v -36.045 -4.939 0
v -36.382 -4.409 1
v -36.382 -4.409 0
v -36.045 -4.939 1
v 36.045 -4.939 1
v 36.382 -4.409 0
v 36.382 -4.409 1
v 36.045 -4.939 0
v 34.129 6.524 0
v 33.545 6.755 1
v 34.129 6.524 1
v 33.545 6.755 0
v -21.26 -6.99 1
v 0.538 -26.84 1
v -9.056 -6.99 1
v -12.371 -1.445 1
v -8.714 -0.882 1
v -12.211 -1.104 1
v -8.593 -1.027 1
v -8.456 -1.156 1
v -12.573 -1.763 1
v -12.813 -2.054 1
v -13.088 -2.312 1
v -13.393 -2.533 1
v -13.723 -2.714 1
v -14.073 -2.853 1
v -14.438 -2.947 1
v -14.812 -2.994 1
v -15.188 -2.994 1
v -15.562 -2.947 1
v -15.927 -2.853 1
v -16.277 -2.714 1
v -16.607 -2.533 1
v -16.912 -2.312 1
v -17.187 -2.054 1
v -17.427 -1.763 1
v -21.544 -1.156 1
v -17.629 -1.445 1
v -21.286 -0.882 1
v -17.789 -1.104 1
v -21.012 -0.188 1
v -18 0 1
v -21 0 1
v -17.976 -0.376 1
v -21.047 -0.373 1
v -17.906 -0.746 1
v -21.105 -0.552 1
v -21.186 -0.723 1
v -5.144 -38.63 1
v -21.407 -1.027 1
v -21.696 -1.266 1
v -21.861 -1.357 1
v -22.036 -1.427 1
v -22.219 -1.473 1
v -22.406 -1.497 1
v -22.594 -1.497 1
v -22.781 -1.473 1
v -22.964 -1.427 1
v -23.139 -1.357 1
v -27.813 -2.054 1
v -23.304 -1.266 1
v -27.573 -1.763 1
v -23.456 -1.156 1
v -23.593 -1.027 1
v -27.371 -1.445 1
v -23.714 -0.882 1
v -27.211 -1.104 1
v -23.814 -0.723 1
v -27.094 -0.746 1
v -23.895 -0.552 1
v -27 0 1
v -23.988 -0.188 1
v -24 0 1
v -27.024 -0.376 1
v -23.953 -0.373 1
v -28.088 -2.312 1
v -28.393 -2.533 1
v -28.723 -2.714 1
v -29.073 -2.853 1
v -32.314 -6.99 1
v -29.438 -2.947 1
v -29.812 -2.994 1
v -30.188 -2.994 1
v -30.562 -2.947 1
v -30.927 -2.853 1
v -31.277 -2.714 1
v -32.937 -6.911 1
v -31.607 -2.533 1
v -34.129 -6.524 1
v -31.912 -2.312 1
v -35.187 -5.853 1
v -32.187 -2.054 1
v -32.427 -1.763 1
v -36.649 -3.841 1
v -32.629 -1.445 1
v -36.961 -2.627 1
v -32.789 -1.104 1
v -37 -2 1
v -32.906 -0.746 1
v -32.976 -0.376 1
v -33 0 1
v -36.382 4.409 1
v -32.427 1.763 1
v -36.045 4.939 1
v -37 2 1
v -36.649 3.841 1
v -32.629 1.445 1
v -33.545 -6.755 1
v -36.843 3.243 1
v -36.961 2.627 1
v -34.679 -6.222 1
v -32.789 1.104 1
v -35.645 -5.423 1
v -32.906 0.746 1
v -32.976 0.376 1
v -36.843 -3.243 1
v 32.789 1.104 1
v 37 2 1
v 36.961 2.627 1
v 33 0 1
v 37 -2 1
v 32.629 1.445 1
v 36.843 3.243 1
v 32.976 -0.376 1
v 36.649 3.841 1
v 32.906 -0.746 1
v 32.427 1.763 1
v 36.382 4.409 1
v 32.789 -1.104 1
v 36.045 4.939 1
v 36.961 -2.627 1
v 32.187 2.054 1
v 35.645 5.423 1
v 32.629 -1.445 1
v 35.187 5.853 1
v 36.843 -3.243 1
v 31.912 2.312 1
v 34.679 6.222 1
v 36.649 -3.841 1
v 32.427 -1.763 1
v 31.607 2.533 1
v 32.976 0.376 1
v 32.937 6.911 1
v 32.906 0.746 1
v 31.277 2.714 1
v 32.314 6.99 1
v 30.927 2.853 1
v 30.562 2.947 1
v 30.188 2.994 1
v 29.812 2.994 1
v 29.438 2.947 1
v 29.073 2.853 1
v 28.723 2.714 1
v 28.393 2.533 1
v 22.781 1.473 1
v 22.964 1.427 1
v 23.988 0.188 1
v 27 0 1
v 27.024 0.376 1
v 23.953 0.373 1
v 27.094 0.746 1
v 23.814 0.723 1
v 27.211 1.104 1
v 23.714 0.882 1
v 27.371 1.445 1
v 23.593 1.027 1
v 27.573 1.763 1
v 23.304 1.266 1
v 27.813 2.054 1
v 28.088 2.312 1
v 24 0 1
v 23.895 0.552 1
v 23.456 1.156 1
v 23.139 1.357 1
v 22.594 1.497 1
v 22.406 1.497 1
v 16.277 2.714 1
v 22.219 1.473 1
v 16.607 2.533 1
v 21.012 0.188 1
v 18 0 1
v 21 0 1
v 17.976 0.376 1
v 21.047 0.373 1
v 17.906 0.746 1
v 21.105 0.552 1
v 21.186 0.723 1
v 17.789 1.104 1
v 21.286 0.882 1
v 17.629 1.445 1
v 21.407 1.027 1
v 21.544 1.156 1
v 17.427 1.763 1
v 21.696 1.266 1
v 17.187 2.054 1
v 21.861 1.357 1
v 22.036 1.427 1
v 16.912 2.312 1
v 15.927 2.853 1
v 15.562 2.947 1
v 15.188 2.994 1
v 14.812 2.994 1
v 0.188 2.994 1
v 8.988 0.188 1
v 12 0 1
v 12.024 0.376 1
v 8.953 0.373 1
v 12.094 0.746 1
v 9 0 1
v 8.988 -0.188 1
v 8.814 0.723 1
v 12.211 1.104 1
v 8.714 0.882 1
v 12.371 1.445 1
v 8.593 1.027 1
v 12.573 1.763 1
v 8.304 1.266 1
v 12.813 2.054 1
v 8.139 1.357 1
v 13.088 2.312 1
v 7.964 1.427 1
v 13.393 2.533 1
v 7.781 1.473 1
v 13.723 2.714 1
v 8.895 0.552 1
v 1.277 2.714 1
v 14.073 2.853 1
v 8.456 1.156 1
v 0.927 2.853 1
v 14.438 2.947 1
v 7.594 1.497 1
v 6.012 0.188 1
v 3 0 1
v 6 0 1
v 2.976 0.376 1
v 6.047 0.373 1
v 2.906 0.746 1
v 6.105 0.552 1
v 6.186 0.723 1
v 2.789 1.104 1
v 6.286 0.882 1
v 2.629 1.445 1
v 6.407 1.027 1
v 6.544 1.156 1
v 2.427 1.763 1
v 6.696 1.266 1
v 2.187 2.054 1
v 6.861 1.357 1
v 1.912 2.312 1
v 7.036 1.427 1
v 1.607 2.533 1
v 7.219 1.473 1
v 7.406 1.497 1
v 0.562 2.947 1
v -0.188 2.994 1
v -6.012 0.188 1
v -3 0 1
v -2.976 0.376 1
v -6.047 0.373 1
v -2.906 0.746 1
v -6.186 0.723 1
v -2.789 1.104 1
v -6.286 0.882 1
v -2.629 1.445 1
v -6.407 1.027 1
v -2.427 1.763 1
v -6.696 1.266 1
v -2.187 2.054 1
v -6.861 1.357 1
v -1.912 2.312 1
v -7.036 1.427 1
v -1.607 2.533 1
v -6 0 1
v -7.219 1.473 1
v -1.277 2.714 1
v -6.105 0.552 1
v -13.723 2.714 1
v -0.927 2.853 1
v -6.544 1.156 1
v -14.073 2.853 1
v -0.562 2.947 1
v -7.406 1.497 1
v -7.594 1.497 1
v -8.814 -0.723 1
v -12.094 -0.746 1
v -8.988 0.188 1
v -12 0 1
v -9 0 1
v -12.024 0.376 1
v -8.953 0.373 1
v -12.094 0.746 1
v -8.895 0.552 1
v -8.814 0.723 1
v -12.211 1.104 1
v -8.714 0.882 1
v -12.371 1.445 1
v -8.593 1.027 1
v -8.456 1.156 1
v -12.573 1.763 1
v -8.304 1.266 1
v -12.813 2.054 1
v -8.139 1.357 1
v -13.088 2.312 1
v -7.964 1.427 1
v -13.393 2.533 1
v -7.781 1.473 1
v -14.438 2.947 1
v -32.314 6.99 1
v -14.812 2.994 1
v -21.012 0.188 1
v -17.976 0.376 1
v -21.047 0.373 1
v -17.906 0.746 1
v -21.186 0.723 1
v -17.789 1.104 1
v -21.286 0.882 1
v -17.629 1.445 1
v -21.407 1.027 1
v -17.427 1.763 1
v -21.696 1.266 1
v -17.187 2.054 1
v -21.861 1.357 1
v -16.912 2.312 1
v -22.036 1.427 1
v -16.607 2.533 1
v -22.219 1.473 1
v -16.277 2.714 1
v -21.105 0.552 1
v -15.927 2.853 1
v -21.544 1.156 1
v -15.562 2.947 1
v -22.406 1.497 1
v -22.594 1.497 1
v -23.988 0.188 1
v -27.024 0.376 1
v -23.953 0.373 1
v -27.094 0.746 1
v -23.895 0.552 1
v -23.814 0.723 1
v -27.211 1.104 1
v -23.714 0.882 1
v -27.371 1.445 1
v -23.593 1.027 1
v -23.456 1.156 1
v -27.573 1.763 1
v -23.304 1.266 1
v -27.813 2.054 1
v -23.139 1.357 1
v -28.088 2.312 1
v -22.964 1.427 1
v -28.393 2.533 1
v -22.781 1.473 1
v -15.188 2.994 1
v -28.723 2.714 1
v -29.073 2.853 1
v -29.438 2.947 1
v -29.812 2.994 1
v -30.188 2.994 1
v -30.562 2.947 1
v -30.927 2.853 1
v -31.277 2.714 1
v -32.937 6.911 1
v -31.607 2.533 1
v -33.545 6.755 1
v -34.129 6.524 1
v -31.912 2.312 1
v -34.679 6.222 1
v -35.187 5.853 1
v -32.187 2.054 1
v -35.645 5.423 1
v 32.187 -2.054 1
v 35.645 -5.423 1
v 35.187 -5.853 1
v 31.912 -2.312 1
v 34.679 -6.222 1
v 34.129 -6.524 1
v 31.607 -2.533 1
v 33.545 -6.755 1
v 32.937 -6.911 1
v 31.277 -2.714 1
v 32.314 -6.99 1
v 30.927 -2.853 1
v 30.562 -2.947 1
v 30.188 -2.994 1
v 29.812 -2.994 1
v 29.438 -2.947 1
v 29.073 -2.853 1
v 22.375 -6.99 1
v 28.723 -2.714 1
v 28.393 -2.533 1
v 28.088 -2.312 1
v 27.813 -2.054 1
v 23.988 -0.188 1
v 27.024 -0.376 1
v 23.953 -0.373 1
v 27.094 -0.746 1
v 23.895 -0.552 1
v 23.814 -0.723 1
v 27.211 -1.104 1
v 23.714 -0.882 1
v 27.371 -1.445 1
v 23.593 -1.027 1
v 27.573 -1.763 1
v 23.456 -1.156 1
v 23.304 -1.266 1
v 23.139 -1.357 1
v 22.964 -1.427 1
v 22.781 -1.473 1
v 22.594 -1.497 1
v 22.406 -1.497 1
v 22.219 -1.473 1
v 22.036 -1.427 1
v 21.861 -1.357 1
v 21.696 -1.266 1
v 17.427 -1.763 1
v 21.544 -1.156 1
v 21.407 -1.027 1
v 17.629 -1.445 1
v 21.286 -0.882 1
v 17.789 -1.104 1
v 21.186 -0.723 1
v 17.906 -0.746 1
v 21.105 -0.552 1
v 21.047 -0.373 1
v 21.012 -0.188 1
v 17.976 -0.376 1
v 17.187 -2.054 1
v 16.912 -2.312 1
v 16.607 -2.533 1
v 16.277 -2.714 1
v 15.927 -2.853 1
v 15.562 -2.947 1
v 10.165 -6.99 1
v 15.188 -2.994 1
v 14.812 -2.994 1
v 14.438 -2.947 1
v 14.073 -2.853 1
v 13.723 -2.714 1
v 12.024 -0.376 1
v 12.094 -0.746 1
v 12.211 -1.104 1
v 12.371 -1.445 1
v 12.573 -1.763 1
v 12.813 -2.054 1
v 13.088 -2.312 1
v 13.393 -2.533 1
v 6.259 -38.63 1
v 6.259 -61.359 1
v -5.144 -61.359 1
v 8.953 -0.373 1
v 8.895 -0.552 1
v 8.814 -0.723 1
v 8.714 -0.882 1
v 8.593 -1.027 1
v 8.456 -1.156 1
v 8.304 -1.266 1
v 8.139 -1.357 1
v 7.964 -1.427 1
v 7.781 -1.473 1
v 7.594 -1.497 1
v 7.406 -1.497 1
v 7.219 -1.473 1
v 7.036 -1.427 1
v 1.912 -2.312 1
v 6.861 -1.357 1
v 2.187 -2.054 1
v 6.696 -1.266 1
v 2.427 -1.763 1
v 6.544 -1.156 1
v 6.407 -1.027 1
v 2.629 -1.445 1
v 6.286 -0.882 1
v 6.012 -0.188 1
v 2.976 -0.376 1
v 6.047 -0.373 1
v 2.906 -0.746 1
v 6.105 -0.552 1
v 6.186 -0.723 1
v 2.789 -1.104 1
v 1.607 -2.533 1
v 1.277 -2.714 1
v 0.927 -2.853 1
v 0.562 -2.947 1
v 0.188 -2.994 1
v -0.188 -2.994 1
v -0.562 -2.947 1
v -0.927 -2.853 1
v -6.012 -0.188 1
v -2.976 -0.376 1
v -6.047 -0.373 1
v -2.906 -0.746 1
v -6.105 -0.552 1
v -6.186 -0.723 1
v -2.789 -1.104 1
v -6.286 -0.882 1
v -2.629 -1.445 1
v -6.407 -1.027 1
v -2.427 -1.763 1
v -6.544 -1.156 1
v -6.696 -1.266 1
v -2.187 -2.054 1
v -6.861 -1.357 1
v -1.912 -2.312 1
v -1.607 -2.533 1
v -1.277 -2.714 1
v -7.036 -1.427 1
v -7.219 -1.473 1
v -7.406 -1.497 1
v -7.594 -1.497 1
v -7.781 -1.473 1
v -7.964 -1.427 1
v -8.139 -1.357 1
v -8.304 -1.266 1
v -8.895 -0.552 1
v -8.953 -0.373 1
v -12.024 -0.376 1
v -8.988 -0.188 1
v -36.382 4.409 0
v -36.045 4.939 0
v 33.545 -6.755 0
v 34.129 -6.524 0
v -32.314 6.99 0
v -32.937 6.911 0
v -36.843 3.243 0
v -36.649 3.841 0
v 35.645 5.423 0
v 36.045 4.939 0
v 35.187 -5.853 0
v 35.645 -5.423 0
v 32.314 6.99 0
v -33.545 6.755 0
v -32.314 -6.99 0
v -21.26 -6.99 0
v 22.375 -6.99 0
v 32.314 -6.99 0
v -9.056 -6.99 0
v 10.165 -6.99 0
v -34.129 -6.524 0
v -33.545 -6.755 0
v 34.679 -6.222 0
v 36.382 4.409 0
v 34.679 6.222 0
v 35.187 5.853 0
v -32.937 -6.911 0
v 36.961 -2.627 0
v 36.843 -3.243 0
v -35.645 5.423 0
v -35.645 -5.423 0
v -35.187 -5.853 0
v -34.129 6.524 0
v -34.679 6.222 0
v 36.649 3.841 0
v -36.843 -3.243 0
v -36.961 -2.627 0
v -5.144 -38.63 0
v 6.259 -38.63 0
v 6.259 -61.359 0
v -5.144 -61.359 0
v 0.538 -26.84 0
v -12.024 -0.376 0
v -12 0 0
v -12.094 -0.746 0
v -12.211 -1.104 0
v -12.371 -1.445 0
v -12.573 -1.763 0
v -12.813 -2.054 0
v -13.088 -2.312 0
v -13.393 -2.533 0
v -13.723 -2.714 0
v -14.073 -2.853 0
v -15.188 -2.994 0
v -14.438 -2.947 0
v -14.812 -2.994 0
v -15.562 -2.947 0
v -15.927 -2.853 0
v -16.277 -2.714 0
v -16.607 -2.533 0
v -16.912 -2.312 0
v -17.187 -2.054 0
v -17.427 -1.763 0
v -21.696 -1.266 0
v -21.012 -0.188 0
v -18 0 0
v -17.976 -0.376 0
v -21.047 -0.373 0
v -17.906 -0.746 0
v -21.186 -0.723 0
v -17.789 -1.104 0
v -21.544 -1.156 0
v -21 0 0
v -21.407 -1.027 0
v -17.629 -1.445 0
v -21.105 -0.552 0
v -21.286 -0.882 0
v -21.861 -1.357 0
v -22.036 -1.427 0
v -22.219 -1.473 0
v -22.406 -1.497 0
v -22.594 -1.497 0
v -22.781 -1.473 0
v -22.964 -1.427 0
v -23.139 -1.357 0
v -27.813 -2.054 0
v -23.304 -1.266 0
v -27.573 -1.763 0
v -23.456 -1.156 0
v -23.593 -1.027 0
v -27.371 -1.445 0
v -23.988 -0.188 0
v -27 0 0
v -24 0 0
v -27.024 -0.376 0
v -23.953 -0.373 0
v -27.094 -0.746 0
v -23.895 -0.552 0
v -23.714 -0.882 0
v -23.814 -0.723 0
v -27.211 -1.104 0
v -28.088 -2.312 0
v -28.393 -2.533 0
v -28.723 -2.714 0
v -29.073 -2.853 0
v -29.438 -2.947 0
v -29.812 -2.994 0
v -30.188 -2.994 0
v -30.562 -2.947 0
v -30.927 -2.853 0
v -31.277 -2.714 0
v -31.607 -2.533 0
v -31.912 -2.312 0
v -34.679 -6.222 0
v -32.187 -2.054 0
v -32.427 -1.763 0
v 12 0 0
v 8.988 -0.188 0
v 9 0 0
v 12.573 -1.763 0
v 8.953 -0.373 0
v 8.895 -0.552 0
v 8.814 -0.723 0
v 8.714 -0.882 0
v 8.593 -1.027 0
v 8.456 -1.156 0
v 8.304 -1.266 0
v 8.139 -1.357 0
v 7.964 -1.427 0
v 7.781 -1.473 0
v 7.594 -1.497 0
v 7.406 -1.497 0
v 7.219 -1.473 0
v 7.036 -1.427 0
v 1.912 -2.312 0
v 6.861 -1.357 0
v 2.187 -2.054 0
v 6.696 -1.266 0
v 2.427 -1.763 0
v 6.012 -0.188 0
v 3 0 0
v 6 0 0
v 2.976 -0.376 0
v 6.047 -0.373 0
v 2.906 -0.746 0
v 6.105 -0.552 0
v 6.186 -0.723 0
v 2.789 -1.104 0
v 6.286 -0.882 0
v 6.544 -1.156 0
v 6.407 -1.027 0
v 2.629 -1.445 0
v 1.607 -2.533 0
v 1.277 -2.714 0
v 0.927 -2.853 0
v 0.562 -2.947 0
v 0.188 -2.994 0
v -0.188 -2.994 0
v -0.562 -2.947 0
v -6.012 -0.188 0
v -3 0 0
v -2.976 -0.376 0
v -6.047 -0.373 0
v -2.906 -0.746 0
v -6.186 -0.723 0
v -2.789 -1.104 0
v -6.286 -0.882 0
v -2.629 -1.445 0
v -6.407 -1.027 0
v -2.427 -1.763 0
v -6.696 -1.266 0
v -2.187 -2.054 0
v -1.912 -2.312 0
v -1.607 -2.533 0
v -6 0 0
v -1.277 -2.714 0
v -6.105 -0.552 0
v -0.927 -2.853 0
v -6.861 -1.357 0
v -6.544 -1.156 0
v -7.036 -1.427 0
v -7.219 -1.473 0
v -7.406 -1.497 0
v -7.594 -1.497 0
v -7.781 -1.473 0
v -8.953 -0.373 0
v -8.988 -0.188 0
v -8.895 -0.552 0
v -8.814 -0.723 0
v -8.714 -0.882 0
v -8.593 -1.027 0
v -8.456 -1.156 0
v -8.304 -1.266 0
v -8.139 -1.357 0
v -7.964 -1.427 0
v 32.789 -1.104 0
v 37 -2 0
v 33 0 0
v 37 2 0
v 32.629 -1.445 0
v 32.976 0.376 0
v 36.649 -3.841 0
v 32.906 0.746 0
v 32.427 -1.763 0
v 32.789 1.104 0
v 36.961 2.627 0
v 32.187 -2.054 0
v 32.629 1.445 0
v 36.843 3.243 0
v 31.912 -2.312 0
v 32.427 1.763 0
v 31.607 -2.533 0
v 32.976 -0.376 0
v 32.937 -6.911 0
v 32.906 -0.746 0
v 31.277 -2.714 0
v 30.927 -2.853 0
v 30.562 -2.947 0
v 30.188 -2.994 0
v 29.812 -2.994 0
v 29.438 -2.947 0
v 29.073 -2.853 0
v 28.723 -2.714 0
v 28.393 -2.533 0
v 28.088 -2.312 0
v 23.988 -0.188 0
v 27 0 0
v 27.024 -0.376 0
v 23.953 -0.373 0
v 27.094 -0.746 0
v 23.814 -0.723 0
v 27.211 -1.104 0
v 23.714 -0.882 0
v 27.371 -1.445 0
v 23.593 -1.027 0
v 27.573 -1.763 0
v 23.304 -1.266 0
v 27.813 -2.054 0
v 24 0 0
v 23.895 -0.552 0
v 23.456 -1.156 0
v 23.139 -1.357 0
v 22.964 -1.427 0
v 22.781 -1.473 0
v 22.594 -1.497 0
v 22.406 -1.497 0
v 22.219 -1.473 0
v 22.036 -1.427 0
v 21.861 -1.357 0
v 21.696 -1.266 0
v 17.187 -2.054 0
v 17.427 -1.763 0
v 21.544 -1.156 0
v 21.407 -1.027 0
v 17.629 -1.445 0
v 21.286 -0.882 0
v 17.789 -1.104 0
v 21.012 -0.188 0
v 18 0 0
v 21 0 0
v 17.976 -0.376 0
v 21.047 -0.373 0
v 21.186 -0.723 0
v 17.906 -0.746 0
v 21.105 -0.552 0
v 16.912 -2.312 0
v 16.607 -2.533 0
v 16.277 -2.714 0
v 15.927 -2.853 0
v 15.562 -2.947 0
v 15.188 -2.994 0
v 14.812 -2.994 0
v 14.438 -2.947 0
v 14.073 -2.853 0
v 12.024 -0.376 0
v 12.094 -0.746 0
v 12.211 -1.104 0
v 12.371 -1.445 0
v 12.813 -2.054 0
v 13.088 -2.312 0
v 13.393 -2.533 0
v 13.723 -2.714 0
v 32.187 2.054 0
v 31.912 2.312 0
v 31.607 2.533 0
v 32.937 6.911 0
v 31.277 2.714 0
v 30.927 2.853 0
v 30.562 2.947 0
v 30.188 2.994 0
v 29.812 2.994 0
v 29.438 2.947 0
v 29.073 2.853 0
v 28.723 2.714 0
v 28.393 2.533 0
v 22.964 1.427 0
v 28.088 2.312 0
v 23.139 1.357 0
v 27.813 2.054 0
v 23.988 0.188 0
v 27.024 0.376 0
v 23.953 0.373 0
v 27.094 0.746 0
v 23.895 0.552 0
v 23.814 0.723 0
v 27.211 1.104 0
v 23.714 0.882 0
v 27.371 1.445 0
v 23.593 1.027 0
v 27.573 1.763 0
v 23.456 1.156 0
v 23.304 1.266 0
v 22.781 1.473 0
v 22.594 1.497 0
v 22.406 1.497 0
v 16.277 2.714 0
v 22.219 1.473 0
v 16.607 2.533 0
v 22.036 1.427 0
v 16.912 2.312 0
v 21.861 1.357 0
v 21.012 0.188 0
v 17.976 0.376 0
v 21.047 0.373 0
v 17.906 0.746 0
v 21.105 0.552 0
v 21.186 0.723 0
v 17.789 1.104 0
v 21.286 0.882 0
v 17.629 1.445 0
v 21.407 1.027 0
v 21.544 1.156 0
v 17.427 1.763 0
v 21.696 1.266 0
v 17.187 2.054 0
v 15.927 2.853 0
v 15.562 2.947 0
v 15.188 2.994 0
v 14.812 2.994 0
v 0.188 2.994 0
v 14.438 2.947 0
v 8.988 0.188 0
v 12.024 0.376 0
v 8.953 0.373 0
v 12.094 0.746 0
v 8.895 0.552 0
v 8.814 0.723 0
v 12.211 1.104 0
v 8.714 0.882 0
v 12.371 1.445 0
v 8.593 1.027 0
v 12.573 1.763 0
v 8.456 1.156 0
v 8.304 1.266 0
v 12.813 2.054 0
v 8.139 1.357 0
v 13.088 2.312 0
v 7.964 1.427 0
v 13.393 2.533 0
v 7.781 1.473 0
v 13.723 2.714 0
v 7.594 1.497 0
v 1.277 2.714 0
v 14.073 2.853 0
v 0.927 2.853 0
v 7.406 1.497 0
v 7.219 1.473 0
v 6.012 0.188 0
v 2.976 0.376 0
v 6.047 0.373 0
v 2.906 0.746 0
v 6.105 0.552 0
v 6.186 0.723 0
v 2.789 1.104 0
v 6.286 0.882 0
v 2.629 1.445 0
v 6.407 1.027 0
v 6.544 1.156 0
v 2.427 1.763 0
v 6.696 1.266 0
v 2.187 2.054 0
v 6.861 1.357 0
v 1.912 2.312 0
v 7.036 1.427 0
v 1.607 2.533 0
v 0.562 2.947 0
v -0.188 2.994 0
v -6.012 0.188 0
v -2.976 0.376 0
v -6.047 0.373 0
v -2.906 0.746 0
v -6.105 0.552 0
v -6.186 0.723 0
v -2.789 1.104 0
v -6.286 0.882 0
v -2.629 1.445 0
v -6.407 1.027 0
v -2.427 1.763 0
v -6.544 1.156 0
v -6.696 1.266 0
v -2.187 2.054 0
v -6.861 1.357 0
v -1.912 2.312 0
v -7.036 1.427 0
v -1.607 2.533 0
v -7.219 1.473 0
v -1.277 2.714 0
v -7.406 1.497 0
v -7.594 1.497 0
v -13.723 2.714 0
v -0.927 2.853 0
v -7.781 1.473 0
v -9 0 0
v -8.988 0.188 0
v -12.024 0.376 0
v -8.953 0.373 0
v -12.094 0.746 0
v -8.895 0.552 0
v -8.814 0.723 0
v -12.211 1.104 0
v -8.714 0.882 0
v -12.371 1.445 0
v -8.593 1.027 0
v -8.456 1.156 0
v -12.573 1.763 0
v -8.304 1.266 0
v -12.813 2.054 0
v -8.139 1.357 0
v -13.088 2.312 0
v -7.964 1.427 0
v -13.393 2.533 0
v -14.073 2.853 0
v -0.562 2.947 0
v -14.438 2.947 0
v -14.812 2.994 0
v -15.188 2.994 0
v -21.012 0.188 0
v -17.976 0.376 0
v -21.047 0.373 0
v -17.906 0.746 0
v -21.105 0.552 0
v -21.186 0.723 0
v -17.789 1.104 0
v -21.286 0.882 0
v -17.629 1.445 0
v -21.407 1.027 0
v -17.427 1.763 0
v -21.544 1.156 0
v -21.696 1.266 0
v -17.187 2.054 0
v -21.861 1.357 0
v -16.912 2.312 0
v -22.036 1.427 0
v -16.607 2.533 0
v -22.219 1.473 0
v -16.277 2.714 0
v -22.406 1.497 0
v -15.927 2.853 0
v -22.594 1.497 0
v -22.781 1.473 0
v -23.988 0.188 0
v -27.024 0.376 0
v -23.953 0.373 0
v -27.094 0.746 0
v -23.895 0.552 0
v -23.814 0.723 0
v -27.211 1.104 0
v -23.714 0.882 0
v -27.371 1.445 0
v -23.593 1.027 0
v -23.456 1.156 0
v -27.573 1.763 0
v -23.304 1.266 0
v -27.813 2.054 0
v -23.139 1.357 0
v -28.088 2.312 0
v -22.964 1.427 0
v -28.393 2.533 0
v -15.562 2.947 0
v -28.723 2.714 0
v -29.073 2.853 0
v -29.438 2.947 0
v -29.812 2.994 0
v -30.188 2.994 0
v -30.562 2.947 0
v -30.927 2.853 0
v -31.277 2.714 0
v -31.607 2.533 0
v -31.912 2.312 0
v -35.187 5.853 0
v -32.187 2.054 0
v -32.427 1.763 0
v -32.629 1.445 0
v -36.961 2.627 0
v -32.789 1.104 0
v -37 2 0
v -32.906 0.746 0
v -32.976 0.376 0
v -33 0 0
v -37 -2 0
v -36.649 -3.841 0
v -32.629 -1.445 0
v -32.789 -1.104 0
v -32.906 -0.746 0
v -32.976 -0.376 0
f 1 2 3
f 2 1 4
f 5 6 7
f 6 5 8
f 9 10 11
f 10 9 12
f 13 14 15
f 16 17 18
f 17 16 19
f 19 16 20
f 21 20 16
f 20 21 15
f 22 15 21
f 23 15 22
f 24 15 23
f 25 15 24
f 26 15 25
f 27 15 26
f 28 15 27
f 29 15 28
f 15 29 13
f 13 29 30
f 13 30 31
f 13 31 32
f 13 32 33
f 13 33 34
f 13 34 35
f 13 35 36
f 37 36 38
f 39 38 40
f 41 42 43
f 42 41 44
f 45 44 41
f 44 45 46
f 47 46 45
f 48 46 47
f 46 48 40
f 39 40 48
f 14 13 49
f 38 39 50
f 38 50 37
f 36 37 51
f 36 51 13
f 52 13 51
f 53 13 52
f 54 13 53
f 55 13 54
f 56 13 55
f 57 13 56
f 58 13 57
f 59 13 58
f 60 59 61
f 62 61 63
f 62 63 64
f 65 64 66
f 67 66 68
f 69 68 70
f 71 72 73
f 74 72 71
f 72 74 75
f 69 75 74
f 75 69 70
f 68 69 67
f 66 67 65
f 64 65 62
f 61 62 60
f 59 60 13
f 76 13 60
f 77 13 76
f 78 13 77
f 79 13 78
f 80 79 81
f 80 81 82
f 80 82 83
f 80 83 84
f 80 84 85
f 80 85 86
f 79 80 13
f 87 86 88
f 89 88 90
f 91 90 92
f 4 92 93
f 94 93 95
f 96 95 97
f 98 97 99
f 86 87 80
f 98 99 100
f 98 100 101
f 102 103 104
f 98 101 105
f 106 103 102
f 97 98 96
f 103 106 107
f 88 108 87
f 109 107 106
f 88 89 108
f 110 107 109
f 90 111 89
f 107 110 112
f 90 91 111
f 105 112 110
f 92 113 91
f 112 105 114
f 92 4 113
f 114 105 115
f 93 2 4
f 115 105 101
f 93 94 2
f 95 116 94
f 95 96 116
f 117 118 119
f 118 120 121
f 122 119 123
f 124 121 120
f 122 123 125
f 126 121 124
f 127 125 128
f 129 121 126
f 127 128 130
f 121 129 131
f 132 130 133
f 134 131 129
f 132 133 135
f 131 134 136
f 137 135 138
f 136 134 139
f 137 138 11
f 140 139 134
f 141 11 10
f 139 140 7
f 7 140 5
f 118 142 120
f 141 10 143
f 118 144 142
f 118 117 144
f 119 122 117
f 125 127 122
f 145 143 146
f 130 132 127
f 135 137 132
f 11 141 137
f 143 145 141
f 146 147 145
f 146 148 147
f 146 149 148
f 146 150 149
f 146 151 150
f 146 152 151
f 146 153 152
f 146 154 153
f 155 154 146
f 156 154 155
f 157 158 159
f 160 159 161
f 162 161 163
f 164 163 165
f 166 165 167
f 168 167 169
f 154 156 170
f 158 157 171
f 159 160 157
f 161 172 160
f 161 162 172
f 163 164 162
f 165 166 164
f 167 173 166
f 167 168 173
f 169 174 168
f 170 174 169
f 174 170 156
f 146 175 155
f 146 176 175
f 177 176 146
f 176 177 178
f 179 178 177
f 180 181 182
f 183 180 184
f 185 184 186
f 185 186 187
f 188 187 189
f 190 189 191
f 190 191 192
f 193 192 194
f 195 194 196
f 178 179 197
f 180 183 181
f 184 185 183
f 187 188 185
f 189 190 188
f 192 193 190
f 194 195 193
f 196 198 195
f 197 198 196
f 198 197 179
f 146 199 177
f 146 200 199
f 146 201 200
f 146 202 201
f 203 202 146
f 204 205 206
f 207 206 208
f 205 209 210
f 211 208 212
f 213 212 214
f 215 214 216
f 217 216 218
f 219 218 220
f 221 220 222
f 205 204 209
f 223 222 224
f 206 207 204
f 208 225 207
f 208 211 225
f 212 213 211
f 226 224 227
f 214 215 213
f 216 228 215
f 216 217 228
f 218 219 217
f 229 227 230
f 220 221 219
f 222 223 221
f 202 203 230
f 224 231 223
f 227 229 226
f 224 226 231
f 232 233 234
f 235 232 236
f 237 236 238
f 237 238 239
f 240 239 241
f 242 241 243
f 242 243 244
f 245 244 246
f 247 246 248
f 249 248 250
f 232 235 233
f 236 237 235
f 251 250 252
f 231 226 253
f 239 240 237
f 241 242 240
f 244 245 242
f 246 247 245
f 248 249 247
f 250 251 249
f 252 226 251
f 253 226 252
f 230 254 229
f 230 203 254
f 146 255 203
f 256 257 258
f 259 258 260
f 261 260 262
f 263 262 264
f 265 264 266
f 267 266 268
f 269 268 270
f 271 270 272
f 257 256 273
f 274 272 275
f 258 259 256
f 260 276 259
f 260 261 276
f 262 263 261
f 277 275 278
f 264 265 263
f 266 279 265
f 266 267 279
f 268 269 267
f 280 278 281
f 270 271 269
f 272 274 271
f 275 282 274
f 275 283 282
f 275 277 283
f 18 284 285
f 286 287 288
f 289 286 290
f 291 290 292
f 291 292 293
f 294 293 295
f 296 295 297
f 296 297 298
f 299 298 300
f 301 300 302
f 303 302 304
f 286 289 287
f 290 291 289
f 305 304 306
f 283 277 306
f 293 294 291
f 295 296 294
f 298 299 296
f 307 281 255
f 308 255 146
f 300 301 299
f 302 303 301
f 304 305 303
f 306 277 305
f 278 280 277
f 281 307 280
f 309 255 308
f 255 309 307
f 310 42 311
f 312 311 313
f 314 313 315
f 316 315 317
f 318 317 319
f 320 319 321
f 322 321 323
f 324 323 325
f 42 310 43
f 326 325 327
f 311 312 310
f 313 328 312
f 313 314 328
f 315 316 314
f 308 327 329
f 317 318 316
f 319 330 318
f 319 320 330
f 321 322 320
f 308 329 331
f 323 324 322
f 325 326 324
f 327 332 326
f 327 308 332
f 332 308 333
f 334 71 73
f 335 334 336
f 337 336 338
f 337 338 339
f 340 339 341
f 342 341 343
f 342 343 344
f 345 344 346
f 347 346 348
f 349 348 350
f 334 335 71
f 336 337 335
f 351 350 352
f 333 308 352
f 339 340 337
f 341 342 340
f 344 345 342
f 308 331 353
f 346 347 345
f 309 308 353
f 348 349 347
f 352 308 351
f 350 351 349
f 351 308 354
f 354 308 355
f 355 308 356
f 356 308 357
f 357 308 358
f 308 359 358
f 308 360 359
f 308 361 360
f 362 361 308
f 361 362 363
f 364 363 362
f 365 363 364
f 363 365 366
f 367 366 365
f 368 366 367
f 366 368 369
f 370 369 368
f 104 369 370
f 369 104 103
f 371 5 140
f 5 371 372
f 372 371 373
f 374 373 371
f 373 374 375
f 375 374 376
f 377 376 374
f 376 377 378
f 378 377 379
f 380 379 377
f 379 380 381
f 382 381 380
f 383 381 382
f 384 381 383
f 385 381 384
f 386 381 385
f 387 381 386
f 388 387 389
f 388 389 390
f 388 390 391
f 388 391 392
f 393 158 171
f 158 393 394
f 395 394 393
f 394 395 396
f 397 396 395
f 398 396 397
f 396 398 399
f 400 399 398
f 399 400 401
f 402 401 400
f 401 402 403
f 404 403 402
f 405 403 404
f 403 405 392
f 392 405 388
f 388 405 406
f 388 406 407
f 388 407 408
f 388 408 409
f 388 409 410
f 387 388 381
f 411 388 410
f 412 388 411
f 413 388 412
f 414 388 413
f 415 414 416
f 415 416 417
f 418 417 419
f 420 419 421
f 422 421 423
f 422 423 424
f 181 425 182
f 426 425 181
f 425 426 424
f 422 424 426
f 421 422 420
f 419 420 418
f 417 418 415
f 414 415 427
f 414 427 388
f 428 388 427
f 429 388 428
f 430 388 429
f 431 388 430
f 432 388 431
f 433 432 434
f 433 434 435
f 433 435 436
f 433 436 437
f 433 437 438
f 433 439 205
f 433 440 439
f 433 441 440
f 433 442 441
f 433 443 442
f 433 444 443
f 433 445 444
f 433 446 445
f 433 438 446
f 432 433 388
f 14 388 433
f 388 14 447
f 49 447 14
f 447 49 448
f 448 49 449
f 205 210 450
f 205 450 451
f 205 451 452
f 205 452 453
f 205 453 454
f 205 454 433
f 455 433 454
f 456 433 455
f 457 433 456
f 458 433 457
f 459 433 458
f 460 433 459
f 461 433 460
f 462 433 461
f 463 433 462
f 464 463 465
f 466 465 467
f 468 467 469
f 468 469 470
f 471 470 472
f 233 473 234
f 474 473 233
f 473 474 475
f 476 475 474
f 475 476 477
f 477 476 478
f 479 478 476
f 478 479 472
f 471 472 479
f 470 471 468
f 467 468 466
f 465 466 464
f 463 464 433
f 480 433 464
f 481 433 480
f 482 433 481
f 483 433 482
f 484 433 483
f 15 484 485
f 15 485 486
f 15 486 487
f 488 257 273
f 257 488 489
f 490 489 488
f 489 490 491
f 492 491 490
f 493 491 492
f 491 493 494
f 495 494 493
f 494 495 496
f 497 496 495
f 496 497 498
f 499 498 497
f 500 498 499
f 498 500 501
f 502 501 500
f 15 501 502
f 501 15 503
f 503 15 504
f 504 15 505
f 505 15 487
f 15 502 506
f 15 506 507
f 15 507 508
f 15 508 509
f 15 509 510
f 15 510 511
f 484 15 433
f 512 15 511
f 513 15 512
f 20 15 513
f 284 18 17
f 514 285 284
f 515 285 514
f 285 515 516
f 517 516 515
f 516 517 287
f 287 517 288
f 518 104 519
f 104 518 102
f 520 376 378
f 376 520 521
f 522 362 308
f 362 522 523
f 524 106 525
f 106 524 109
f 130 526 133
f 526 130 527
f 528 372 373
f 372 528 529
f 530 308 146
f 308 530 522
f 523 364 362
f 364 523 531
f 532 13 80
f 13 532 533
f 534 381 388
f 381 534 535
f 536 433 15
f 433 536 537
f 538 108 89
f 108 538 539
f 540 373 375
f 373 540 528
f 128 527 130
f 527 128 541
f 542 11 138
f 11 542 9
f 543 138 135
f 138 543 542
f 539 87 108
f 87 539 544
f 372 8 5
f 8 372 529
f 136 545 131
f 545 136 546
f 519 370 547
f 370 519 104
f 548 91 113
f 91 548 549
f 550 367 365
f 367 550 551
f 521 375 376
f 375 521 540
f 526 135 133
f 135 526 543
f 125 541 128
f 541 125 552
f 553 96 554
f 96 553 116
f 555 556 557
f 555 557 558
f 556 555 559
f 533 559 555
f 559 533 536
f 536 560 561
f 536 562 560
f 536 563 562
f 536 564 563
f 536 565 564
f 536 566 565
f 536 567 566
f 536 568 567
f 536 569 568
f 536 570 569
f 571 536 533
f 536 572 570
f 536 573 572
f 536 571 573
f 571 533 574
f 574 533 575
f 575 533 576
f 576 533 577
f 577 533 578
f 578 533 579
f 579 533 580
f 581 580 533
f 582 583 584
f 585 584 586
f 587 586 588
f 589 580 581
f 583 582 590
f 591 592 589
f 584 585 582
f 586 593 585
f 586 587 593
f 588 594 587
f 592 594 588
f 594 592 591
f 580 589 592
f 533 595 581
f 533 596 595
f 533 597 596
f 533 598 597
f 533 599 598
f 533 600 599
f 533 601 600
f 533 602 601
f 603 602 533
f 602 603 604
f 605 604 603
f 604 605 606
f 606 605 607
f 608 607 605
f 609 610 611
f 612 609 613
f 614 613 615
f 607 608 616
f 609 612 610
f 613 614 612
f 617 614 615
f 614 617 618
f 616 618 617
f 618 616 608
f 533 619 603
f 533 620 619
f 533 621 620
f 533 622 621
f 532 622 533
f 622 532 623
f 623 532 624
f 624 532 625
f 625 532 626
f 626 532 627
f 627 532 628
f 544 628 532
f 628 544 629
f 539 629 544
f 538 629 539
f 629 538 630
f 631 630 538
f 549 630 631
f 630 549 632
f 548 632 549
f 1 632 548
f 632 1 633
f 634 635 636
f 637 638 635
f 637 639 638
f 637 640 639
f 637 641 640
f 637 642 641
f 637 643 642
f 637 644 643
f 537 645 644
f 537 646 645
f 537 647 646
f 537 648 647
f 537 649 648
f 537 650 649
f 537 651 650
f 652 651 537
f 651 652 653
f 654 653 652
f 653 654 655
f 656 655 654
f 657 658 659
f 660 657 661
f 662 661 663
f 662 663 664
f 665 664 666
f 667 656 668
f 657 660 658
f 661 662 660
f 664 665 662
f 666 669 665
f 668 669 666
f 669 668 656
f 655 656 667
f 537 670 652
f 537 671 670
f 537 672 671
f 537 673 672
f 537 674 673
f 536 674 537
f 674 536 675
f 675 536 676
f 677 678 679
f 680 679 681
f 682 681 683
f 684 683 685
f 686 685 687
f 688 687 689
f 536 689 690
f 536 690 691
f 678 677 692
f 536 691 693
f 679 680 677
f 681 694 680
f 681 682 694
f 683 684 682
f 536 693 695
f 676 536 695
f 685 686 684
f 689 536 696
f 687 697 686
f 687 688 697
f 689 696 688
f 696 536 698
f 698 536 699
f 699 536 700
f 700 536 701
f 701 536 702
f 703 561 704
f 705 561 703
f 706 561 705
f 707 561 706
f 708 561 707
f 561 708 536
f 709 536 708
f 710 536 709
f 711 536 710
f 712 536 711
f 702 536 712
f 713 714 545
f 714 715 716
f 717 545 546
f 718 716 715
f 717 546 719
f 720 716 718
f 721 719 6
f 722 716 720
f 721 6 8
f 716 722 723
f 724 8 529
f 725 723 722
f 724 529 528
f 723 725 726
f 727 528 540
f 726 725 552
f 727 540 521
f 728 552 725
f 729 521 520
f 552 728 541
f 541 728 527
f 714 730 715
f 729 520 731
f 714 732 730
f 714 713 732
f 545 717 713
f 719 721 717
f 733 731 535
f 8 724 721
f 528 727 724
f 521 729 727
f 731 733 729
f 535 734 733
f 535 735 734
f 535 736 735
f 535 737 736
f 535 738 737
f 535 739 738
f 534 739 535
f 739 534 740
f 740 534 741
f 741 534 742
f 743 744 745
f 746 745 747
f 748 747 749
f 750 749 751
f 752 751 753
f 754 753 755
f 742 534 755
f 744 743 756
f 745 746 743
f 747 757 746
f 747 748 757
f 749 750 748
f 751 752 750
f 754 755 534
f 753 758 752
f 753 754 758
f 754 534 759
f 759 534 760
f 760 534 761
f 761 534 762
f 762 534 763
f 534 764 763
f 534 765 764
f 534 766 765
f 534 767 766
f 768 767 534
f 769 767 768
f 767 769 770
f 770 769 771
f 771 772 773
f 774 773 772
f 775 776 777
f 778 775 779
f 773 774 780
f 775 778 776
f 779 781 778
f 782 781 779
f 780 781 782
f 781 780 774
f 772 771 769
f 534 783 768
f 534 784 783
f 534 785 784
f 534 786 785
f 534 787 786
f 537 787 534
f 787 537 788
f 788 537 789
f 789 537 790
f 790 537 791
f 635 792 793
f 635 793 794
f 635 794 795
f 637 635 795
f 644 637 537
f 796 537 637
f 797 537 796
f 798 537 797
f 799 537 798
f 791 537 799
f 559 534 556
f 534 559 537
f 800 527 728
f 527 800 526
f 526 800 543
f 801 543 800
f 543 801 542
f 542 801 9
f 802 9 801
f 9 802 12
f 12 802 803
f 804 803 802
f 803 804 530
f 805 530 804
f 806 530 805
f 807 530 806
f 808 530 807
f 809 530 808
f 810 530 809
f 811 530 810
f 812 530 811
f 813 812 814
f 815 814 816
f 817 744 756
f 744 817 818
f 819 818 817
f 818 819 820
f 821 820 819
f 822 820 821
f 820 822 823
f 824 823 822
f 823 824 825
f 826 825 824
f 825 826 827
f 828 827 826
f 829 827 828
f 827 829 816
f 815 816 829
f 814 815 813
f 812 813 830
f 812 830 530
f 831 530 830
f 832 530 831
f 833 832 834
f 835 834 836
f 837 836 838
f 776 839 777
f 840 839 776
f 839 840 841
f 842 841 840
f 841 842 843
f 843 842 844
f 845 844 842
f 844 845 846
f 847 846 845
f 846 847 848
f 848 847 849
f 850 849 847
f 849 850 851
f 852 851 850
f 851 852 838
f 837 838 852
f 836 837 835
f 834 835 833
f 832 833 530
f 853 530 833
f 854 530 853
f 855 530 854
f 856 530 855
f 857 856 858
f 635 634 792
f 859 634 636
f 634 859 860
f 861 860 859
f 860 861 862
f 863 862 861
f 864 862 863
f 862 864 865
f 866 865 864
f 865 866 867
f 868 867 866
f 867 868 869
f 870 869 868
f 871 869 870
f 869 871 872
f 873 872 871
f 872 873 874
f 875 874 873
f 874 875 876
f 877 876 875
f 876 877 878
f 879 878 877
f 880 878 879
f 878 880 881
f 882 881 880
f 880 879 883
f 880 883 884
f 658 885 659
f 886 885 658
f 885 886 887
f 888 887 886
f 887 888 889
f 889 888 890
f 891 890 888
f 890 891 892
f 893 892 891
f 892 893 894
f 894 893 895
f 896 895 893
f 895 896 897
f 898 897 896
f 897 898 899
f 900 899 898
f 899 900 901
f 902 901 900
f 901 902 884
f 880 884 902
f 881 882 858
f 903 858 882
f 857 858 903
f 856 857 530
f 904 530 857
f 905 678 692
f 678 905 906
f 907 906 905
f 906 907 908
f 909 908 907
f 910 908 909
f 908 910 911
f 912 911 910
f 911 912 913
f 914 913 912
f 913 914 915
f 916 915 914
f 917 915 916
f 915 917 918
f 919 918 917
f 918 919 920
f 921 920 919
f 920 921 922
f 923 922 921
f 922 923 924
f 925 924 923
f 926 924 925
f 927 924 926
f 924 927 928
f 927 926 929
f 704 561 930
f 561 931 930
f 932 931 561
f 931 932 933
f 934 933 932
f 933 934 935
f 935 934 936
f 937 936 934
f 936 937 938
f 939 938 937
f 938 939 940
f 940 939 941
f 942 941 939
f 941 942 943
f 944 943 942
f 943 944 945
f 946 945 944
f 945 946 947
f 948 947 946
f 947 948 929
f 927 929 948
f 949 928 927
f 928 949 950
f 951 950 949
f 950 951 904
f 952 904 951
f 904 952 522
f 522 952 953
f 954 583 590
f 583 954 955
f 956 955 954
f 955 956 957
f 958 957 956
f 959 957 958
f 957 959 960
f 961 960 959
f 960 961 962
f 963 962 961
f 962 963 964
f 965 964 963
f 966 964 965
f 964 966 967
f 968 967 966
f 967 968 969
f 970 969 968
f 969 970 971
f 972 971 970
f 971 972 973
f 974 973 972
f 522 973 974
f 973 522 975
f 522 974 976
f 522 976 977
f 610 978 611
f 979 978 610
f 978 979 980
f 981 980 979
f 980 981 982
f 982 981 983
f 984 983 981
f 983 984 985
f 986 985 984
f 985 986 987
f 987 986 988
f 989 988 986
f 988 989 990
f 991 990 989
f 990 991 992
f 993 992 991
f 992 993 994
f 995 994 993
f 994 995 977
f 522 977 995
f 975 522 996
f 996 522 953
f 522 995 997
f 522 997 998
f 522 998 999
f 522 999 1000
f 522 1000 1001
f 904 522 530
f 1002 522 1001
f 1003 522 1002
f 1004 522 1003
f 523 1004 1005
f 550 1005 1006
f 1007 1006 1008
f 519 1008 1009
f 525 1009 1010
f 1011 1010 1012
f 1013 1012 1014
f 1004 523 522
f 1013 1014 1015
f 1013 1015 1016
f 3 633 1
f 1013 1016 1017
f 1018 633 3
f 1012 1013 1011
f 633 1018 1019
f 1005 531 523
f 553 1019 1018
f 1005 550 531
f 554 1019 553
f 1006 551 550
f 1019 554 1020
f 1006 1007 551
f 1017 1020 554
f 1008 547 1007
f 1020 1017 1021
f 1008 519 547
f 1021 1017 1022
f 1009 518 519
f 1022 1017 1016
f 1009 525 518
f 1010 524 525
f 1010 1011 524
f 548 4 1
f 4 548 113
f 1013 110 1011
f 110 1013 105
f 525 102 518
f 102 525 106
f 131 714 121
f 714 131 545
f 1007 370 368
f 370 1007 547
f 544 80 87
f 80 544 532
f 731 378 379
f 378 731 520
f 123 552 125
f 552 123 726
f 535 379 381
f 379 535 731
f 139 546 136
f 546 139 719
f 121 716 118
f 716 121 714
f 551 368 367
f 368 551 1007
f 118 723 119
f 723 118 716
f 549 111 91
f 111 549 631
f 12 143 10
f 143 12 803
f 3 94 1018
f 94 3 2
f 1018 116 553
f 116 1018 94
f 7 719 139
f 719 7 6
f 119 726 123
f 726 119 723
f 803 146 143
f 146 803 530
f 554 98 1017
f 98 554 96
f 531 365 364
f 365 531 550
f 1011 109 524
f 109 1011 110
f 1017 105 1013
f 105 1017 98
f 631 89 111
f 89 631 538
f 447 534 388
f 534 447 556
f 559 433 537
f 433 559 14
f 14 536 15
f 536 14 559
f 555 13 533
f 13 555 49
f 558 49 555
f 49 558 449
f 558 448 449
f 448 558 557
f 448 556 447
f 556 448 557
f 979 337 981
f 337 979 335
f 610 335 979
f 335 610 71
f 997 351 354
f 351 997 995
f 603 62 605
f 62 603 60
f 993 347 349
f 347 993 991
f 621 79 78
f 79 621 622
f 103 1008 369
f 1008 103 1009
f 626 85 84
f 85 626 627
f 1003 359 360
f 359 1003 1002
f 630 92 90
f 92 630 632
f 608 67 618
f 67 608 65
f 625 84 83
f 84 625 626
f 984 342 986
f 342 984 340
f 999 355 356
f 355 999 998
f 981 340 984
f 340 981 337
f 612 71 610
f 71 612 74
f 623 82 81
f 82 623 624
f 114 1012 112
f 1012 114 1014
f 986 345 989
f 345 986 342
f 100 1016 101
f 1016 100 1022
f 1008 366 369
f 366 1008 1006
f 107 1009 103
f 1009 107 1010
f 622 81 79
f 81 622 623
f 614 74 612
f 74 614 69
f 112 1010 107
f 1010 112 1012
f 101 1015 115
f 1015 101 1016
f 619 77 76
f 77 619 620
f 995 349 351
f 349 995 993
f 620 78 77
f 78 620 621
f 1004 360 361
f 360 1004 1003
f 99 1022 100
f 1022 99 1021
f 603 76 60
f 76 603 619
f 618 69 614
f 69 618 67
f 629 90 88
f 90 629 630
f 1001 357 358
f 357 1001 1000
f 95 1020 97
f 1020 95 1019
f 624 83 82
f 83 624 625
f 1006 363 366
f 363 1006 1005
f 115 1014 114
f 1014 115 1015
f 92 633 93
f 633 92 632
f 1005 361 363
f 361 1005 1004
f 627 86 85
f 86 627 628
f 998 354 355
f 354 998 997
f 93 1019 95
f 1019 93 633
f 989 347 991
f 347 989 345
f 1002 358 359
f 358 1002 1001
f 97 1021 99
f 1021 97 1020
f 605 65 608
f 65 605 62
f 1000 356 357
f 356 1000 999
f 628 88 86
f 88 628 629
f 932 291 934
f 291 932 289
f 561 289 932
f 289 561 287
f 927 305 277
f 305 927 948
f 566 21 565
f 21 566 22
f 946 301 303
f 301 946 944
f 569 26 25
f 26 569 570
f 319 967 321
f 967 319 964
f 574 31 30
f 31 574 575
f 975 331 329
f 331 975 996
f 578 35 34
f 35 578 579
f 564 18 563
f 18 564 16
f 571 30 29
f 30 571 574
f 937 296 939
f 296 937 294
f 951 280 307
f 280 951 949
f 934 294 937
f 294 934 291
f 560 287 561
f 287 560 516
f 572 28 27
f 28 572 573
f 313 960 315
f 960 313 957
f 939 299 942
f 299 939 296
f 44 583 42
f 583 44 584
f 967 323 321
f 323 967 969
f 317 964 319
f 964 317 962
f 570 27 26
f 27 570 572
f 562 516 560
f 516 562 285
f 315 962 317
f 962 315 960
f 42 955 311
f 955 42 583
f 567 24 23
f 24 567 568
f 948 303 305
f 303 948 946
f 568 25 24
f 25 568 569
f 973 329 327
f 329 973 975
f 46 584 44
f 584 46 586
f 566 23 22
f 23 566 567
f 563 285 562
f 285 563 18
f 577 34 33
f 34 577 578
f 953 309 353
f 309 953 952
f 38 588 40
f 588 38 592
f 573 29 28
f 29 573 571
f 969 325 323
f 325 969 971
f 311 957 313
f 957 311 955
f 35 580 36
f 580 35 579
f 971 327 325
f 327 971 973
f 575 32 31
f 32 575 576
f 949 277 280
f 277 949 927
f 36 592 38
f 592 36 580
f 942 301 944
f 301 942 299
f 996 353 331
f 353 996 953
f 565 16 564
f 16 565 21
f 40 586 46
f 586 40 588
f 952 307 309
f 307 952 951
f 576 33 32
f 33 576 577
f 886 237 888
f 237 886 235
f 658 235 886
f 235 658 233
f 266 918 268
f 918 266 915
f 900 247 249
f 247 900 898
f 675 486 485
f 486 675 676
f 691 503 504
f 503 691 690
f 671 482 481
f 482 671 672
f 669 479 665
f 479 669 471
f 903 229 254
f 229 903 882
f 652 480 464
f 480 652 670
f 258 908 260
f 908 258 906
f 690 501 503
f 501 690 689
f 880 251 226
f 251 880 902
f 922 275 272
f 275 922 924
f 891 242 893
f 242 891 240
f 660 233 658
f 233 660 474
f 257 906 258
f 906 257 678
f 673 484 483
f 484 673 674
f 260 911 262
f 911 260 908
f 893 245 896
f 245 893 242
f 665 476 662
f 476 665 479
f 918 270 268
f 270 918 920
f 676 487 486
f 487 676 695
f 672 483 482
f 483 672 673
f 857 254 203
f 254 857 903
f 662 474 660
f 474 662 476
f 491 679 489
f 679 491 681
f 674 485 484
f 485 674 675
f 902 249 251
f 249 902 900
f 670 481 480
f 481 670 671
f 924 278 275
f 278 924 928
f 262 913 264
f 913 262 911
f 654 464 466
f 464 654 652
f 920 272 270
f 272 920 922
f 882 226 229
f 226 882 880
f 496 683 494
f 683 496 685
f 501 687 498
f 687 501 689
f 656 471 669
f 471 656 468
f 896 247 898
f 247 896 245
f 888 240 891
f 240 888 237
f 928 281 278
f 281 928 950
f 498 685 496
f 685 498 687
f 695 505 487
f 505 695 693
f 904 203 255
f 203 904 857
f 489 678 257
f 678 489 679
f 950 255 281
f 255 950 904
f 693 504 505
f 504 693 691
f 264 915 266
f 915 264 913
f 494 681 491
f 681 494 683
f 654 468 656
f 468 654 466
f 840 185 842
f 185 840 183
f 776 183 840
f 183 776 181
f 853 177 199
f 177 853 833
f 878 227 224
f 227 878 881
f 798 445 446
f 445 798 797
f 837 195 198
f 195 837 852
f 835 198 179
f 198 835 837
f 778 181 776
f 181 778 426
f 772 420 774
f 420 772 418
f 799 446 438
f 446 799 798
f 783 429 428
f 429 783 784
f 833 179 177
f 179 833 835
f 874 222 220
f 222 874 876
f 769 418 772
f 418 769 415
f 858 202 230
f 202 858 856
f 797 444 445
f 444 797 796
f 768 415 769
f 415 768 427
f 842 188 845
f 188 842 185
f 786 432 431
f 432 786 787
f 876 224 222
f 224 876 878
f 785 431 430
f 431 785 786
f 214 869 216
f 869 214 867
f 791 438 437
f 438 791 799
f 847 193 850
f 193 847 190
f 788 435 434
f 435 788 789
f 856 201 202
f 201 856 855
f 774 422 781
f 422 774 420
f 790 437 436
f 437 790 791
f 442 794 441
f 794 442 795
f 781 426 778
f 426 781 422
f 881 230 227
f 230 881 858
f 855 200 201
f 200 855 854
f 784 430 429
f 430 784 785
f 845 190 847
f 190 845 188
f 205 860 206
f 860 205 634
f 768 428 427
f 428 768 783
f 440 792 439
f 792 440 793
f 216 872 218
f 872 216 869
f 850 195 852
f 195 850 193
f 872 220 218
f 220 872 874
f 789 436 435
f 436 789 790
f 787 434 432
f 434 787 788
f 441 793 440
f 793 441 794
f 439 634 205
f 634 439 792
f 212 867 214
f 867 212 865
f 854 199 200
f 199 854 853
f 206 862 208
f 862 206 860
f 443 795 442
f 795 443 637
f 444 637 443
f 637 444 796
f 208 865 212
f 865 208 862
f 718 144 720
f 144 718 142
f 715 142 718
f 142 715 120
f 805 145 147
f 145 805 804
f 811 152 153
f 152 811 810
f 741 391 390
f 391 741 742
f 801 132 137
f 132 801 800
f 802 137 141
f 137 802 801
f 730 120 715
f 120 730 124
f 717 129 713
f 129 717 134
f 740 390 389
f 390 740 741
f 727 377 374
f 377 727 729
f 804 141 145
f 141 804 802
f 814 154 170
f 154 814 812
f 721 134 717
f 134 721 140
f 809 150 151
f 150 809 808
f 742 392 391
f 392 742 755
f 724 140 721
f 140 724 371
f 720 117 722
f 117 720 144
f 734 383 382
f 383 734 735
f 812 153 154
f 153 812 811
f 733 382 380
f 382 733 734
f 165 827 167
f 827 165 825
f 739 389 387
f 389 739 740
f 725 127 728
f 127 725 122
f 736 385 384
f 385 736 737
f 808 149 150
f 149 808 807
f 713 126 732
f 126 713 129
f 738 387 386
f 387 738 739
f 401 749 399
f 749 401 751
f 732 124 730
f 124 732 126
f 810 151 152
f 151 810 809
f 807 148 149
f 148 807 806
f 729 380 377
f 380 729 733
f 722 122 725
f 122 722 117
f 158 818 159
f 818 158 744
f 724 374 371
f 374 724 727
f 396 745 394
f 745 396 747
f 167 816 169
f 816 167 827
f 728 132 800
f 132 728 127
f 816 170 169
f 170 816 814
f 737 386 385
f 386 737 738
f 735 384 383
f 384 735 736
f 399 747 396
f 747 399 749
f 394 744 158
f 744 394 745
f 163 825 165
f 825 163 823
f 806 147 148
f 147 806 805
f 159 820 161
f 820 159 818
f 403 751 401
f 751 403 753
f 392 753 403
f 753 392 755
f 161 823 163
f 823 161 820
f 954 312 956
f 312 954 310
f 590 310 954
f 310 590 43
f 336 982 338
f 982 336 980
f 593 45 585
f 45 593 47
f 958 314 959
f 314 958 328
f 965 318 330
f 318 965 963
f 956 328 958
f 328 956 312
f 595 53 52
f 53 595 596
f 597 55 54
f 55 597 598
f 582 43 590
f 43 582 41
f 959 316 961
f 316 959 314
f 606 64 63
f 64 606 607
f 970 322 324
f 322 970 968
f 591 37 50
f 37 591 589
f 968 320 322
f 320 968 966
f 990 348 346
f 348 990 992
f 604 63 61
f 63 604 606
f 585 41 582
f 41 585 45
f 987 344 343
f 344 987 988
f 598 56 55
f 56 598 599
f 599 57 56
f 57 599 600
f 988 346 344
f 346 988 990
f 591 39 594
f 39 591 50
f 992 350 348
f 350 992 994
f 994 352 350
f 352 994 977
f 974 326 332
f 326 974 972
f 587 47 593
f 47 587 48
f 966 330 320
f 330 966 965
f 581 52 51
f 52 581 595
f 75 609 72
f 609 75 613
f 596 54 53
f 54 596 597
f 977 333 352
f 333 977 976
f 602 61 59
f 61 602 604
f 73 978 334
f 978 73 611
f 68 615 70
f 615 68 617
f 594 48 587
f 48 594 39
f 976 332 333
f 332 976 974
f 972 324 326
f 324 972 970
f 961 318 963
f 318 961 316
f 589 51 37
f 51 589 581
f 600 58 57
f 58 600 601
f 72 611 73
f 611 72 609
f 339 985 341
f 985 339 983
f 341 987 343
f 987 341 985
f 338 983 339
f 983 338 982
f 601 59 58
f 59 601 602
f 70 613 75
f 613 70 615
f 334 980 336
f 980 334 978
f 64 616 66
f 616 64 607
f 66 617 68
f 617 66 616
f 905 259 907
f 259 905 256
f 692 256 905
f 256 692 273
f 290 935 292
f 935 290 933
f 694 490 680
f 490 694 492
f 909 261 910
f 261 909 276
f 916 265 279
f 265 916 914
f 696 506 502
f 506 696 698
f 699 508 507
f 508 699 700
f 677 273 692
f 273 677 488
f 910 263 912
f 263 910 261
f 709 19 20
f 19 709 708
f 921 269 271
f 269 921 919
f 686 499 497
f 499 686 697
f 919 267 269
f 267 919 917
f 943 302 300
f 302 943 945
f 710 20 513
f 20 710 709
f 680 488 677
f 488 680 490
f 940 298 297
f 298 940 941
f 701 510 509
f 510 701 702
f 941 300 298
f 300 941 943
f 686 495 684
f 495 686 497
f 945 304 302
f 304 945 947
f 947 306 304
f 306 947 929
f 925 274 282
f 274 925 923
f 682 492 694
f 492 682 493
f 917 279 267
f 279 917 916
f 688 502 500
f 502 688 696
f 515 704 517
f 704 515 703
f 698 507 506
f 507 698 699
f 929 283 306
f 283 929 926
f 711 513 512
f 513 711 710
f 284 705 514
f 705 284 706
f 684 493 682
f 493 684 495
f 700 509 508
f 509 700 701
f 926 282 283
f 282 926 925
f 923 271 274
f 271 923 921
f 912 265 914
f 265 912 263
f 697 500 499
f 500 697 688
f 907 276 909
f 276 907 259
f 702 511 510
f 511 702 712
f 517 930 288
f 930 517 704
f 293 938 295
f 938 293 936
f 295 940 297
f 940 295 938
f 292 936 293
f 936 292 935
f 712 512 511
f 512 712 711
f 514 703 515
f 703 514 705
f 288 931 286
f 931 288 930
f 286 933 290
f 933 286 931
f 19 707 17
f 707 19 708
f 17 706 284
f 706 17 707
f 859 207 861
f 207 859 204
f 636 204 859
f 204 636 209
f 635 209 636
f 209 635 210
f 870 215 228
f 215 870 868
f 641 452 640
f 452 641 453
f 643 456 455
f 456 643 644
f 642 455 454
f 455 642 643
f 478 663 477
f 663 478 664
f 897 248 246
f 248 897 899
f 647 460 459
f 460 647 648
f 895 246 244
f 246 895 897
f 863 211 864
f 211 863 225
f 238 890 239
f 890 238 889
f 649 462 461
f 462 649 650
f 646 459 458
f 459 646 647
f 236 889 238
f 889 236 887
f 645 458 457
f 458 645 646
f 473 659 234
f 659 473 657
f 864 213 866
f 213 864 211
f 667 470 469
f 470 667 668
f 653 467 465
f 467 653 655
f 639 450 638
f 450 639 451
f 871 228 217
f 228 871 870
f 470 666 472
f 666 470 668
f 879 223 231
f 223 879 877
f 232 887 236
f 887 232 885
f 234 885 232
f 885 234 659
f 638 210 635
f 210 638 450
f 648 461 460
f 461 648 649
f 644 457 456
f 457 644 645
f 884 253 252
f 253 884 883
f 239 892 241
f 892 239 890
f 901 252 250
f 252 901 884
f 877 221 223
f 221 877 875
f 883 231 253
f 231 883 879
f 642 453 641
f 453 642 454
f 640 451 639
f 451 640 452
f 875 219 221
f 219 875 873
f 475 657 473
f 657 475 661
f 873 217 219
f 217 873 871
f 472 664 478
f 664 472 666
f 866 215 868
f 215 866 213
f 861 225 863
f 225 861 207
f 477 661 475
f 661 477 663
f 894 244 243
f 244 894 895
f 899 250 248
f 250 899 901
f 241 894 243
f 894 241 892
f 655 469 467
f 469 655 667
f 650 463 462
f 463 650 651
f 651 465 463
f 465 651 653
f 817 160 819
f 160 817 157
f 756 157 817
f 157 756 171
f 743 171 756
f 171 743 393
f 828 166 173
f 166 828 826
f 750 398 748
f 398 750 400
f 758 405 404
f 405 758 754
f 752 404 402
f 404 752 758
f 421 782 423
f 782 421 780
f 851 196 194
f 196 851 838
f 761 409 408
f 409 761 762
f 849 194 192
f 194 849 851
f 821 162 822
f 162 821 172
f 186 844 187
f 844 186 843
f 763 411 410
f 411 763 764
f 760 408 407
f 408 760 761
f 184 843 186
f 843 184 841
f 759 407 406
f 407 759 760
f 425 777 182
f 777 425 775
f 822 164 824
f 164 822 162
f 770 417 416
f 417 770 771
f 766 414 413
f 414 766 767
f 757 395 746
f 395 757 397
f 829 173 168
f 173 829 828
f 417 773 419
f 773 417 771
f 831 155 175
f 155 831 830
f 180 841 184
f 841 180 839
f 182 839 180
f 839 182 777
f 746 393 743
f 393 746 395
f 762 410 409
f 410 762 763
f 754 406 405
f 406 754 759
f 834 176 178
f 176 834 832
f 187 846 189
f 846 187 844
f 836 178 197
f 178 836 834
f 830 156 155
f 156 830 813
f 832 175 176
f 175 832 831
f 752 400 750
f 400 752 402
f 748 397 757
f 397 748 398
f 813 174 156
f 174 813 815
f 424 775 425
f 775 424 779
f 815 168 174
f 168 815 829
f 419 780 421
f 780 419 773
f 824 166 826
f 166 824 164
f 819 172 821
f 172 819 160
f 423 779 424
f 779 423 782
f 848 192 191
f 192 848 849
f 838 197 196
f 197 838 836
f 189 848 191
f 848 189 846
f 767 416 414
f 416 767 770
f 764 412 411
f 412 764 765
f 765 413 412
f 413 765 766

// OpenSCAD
$fn = 50;


difference() {
	union() {
		*color(alpha = 1.0000000000, c = "gray") {
			translate(v = [0, 14, 0]) {
				linear_extrude(height = 1) {
					text(font = "Arial:style=Bold", halign = "center", size = 4.5000000000, text = "COMMENT description oobb_plate_shape_p_type_1_depth_5_width_1_thickness_y_extra_oobb_size", valign = "center");
				}
			}
		}
		hull() {
			translate(v = [-32.0000000000, 2.0000000000, 0]) {
				cylinder(h = 1, r = 5);
			}
			translate(v = [32.0000000000, 2.0000000000, 0]) {
				cylinder(h = 1, r = 5);
			}
			translate(v = [-32.0000000000, -2.0000000000, 0]) {
				cylinder(h = 1, r = 5);
			}
			translate(v = [32.0000000000, -2.0000000000, 0]) {
				cylinder(h = 1, r = 5);
			}
		}
		translate(v = [0, -5, 0]) {
			linear_extrude(height = 1) {
				text(font = "DejaVu Sans Mono:style=Bold", halign = "center", size = 57.0000000000, text = "Y", valign = "top");
			}
		}
	}
	union() {
		*color(alpha = 1.0000000000, c = "gray") {
			translate(v = [0, 14, 0]) {
				linear_extrude(height = 1) {
					text(font = "Arial:style=Bold", halign = "center", size = 4.5000000000, text = "COMMENT description oobb_holes_shape_n_type_5_width_1_thickness_y_extra_oobb_size_1_height_'all'_holes_true_both_holes", valign = "center");
				}
			}
		}
		translate(v = [-30.0000000000, 0.0000000000, 0]) {
			translate(v = [0, 0, -50]) {
				cylinder(h = 100, r = 3.0000000000);
			}
		}
		translate(v = [-15.0000000000, 0.0000000000, 0]) {
			translate(v = [0, 0, -50]) {
				cylinder(h = 100, r = 3.0000000000);
			}
		}
		translate(v = [0, 0, -50]) {
			cylinder(h = 100, r = 3.0000000000);
		}
		translate(v = [15.0000000000, 0.0000000000, 0]) {
			translate(v = [0, 0, -50]) {
				cylinder(h = 100, r = 3.0000000000);
			}
		}
		translate(v = [30.0000000000, 0.0000000000, 0]) {
			translate(v = [0, 0, -50]) {
				cylinder(h = 100, r = 3.0000000000);
			}
		}
		translate(v = [-30.0000000000, 0.0000000000, 0]) {
			translate(v = [0, 0, -50]) {
				cylinder(h = 100, r = 1.5000000000);
			}
		}
		translate(v = [-22.5000000000, 0.0000000000, 0]) {
			translate(v = [0, 0, -50]) {
				cylinder(h = 100, r = 1.5000000000);
			}
		}
		translate(v = [-15.0000000000, 0.0000000000, 0]) {
			translate(v = [0, 0, -50]) {
				cylinder(h = 100, r = 1.5000000000);
			}
		}
		translate(v = [-7.5000000000, 0.0000000000, 0]) {
			translate(v = [0, 0, -50]) {
				cylinder(h = 100, r = 1.5000000000);
			}
		}
		translate(v = [0, 0, -50]) {
			cylinder(h = 100, r = 1.5000000000);
		}
		translate(v = [7.5000000000, 0.0000000000, 0]) {
			translate(v = [0, 0, -50]) {
				cylinder(h = 100, r = 1.5000000000);
			}
		}
		translate(v = [15.0000000000, 0.0000000000, 0]) {
			translate(v = [0, 0, -50]) {
				cylinder(h = 100, r = 1.5000000000);
			}
		}
		translate(v = [22.5000000000, 0.0000000000, 0]) {
			translate(v = [0, 0, -50]) {
				cylinder(h = 100, r = 1.5000000000);
			}
		}
		translate(v = [30.0000000000, 0.0000000000, 0]) {
			translate(v = [0, 0, -50]) {
				cylinder(h = 100, r = 1.5000000000);
			}
		}
	}
}
